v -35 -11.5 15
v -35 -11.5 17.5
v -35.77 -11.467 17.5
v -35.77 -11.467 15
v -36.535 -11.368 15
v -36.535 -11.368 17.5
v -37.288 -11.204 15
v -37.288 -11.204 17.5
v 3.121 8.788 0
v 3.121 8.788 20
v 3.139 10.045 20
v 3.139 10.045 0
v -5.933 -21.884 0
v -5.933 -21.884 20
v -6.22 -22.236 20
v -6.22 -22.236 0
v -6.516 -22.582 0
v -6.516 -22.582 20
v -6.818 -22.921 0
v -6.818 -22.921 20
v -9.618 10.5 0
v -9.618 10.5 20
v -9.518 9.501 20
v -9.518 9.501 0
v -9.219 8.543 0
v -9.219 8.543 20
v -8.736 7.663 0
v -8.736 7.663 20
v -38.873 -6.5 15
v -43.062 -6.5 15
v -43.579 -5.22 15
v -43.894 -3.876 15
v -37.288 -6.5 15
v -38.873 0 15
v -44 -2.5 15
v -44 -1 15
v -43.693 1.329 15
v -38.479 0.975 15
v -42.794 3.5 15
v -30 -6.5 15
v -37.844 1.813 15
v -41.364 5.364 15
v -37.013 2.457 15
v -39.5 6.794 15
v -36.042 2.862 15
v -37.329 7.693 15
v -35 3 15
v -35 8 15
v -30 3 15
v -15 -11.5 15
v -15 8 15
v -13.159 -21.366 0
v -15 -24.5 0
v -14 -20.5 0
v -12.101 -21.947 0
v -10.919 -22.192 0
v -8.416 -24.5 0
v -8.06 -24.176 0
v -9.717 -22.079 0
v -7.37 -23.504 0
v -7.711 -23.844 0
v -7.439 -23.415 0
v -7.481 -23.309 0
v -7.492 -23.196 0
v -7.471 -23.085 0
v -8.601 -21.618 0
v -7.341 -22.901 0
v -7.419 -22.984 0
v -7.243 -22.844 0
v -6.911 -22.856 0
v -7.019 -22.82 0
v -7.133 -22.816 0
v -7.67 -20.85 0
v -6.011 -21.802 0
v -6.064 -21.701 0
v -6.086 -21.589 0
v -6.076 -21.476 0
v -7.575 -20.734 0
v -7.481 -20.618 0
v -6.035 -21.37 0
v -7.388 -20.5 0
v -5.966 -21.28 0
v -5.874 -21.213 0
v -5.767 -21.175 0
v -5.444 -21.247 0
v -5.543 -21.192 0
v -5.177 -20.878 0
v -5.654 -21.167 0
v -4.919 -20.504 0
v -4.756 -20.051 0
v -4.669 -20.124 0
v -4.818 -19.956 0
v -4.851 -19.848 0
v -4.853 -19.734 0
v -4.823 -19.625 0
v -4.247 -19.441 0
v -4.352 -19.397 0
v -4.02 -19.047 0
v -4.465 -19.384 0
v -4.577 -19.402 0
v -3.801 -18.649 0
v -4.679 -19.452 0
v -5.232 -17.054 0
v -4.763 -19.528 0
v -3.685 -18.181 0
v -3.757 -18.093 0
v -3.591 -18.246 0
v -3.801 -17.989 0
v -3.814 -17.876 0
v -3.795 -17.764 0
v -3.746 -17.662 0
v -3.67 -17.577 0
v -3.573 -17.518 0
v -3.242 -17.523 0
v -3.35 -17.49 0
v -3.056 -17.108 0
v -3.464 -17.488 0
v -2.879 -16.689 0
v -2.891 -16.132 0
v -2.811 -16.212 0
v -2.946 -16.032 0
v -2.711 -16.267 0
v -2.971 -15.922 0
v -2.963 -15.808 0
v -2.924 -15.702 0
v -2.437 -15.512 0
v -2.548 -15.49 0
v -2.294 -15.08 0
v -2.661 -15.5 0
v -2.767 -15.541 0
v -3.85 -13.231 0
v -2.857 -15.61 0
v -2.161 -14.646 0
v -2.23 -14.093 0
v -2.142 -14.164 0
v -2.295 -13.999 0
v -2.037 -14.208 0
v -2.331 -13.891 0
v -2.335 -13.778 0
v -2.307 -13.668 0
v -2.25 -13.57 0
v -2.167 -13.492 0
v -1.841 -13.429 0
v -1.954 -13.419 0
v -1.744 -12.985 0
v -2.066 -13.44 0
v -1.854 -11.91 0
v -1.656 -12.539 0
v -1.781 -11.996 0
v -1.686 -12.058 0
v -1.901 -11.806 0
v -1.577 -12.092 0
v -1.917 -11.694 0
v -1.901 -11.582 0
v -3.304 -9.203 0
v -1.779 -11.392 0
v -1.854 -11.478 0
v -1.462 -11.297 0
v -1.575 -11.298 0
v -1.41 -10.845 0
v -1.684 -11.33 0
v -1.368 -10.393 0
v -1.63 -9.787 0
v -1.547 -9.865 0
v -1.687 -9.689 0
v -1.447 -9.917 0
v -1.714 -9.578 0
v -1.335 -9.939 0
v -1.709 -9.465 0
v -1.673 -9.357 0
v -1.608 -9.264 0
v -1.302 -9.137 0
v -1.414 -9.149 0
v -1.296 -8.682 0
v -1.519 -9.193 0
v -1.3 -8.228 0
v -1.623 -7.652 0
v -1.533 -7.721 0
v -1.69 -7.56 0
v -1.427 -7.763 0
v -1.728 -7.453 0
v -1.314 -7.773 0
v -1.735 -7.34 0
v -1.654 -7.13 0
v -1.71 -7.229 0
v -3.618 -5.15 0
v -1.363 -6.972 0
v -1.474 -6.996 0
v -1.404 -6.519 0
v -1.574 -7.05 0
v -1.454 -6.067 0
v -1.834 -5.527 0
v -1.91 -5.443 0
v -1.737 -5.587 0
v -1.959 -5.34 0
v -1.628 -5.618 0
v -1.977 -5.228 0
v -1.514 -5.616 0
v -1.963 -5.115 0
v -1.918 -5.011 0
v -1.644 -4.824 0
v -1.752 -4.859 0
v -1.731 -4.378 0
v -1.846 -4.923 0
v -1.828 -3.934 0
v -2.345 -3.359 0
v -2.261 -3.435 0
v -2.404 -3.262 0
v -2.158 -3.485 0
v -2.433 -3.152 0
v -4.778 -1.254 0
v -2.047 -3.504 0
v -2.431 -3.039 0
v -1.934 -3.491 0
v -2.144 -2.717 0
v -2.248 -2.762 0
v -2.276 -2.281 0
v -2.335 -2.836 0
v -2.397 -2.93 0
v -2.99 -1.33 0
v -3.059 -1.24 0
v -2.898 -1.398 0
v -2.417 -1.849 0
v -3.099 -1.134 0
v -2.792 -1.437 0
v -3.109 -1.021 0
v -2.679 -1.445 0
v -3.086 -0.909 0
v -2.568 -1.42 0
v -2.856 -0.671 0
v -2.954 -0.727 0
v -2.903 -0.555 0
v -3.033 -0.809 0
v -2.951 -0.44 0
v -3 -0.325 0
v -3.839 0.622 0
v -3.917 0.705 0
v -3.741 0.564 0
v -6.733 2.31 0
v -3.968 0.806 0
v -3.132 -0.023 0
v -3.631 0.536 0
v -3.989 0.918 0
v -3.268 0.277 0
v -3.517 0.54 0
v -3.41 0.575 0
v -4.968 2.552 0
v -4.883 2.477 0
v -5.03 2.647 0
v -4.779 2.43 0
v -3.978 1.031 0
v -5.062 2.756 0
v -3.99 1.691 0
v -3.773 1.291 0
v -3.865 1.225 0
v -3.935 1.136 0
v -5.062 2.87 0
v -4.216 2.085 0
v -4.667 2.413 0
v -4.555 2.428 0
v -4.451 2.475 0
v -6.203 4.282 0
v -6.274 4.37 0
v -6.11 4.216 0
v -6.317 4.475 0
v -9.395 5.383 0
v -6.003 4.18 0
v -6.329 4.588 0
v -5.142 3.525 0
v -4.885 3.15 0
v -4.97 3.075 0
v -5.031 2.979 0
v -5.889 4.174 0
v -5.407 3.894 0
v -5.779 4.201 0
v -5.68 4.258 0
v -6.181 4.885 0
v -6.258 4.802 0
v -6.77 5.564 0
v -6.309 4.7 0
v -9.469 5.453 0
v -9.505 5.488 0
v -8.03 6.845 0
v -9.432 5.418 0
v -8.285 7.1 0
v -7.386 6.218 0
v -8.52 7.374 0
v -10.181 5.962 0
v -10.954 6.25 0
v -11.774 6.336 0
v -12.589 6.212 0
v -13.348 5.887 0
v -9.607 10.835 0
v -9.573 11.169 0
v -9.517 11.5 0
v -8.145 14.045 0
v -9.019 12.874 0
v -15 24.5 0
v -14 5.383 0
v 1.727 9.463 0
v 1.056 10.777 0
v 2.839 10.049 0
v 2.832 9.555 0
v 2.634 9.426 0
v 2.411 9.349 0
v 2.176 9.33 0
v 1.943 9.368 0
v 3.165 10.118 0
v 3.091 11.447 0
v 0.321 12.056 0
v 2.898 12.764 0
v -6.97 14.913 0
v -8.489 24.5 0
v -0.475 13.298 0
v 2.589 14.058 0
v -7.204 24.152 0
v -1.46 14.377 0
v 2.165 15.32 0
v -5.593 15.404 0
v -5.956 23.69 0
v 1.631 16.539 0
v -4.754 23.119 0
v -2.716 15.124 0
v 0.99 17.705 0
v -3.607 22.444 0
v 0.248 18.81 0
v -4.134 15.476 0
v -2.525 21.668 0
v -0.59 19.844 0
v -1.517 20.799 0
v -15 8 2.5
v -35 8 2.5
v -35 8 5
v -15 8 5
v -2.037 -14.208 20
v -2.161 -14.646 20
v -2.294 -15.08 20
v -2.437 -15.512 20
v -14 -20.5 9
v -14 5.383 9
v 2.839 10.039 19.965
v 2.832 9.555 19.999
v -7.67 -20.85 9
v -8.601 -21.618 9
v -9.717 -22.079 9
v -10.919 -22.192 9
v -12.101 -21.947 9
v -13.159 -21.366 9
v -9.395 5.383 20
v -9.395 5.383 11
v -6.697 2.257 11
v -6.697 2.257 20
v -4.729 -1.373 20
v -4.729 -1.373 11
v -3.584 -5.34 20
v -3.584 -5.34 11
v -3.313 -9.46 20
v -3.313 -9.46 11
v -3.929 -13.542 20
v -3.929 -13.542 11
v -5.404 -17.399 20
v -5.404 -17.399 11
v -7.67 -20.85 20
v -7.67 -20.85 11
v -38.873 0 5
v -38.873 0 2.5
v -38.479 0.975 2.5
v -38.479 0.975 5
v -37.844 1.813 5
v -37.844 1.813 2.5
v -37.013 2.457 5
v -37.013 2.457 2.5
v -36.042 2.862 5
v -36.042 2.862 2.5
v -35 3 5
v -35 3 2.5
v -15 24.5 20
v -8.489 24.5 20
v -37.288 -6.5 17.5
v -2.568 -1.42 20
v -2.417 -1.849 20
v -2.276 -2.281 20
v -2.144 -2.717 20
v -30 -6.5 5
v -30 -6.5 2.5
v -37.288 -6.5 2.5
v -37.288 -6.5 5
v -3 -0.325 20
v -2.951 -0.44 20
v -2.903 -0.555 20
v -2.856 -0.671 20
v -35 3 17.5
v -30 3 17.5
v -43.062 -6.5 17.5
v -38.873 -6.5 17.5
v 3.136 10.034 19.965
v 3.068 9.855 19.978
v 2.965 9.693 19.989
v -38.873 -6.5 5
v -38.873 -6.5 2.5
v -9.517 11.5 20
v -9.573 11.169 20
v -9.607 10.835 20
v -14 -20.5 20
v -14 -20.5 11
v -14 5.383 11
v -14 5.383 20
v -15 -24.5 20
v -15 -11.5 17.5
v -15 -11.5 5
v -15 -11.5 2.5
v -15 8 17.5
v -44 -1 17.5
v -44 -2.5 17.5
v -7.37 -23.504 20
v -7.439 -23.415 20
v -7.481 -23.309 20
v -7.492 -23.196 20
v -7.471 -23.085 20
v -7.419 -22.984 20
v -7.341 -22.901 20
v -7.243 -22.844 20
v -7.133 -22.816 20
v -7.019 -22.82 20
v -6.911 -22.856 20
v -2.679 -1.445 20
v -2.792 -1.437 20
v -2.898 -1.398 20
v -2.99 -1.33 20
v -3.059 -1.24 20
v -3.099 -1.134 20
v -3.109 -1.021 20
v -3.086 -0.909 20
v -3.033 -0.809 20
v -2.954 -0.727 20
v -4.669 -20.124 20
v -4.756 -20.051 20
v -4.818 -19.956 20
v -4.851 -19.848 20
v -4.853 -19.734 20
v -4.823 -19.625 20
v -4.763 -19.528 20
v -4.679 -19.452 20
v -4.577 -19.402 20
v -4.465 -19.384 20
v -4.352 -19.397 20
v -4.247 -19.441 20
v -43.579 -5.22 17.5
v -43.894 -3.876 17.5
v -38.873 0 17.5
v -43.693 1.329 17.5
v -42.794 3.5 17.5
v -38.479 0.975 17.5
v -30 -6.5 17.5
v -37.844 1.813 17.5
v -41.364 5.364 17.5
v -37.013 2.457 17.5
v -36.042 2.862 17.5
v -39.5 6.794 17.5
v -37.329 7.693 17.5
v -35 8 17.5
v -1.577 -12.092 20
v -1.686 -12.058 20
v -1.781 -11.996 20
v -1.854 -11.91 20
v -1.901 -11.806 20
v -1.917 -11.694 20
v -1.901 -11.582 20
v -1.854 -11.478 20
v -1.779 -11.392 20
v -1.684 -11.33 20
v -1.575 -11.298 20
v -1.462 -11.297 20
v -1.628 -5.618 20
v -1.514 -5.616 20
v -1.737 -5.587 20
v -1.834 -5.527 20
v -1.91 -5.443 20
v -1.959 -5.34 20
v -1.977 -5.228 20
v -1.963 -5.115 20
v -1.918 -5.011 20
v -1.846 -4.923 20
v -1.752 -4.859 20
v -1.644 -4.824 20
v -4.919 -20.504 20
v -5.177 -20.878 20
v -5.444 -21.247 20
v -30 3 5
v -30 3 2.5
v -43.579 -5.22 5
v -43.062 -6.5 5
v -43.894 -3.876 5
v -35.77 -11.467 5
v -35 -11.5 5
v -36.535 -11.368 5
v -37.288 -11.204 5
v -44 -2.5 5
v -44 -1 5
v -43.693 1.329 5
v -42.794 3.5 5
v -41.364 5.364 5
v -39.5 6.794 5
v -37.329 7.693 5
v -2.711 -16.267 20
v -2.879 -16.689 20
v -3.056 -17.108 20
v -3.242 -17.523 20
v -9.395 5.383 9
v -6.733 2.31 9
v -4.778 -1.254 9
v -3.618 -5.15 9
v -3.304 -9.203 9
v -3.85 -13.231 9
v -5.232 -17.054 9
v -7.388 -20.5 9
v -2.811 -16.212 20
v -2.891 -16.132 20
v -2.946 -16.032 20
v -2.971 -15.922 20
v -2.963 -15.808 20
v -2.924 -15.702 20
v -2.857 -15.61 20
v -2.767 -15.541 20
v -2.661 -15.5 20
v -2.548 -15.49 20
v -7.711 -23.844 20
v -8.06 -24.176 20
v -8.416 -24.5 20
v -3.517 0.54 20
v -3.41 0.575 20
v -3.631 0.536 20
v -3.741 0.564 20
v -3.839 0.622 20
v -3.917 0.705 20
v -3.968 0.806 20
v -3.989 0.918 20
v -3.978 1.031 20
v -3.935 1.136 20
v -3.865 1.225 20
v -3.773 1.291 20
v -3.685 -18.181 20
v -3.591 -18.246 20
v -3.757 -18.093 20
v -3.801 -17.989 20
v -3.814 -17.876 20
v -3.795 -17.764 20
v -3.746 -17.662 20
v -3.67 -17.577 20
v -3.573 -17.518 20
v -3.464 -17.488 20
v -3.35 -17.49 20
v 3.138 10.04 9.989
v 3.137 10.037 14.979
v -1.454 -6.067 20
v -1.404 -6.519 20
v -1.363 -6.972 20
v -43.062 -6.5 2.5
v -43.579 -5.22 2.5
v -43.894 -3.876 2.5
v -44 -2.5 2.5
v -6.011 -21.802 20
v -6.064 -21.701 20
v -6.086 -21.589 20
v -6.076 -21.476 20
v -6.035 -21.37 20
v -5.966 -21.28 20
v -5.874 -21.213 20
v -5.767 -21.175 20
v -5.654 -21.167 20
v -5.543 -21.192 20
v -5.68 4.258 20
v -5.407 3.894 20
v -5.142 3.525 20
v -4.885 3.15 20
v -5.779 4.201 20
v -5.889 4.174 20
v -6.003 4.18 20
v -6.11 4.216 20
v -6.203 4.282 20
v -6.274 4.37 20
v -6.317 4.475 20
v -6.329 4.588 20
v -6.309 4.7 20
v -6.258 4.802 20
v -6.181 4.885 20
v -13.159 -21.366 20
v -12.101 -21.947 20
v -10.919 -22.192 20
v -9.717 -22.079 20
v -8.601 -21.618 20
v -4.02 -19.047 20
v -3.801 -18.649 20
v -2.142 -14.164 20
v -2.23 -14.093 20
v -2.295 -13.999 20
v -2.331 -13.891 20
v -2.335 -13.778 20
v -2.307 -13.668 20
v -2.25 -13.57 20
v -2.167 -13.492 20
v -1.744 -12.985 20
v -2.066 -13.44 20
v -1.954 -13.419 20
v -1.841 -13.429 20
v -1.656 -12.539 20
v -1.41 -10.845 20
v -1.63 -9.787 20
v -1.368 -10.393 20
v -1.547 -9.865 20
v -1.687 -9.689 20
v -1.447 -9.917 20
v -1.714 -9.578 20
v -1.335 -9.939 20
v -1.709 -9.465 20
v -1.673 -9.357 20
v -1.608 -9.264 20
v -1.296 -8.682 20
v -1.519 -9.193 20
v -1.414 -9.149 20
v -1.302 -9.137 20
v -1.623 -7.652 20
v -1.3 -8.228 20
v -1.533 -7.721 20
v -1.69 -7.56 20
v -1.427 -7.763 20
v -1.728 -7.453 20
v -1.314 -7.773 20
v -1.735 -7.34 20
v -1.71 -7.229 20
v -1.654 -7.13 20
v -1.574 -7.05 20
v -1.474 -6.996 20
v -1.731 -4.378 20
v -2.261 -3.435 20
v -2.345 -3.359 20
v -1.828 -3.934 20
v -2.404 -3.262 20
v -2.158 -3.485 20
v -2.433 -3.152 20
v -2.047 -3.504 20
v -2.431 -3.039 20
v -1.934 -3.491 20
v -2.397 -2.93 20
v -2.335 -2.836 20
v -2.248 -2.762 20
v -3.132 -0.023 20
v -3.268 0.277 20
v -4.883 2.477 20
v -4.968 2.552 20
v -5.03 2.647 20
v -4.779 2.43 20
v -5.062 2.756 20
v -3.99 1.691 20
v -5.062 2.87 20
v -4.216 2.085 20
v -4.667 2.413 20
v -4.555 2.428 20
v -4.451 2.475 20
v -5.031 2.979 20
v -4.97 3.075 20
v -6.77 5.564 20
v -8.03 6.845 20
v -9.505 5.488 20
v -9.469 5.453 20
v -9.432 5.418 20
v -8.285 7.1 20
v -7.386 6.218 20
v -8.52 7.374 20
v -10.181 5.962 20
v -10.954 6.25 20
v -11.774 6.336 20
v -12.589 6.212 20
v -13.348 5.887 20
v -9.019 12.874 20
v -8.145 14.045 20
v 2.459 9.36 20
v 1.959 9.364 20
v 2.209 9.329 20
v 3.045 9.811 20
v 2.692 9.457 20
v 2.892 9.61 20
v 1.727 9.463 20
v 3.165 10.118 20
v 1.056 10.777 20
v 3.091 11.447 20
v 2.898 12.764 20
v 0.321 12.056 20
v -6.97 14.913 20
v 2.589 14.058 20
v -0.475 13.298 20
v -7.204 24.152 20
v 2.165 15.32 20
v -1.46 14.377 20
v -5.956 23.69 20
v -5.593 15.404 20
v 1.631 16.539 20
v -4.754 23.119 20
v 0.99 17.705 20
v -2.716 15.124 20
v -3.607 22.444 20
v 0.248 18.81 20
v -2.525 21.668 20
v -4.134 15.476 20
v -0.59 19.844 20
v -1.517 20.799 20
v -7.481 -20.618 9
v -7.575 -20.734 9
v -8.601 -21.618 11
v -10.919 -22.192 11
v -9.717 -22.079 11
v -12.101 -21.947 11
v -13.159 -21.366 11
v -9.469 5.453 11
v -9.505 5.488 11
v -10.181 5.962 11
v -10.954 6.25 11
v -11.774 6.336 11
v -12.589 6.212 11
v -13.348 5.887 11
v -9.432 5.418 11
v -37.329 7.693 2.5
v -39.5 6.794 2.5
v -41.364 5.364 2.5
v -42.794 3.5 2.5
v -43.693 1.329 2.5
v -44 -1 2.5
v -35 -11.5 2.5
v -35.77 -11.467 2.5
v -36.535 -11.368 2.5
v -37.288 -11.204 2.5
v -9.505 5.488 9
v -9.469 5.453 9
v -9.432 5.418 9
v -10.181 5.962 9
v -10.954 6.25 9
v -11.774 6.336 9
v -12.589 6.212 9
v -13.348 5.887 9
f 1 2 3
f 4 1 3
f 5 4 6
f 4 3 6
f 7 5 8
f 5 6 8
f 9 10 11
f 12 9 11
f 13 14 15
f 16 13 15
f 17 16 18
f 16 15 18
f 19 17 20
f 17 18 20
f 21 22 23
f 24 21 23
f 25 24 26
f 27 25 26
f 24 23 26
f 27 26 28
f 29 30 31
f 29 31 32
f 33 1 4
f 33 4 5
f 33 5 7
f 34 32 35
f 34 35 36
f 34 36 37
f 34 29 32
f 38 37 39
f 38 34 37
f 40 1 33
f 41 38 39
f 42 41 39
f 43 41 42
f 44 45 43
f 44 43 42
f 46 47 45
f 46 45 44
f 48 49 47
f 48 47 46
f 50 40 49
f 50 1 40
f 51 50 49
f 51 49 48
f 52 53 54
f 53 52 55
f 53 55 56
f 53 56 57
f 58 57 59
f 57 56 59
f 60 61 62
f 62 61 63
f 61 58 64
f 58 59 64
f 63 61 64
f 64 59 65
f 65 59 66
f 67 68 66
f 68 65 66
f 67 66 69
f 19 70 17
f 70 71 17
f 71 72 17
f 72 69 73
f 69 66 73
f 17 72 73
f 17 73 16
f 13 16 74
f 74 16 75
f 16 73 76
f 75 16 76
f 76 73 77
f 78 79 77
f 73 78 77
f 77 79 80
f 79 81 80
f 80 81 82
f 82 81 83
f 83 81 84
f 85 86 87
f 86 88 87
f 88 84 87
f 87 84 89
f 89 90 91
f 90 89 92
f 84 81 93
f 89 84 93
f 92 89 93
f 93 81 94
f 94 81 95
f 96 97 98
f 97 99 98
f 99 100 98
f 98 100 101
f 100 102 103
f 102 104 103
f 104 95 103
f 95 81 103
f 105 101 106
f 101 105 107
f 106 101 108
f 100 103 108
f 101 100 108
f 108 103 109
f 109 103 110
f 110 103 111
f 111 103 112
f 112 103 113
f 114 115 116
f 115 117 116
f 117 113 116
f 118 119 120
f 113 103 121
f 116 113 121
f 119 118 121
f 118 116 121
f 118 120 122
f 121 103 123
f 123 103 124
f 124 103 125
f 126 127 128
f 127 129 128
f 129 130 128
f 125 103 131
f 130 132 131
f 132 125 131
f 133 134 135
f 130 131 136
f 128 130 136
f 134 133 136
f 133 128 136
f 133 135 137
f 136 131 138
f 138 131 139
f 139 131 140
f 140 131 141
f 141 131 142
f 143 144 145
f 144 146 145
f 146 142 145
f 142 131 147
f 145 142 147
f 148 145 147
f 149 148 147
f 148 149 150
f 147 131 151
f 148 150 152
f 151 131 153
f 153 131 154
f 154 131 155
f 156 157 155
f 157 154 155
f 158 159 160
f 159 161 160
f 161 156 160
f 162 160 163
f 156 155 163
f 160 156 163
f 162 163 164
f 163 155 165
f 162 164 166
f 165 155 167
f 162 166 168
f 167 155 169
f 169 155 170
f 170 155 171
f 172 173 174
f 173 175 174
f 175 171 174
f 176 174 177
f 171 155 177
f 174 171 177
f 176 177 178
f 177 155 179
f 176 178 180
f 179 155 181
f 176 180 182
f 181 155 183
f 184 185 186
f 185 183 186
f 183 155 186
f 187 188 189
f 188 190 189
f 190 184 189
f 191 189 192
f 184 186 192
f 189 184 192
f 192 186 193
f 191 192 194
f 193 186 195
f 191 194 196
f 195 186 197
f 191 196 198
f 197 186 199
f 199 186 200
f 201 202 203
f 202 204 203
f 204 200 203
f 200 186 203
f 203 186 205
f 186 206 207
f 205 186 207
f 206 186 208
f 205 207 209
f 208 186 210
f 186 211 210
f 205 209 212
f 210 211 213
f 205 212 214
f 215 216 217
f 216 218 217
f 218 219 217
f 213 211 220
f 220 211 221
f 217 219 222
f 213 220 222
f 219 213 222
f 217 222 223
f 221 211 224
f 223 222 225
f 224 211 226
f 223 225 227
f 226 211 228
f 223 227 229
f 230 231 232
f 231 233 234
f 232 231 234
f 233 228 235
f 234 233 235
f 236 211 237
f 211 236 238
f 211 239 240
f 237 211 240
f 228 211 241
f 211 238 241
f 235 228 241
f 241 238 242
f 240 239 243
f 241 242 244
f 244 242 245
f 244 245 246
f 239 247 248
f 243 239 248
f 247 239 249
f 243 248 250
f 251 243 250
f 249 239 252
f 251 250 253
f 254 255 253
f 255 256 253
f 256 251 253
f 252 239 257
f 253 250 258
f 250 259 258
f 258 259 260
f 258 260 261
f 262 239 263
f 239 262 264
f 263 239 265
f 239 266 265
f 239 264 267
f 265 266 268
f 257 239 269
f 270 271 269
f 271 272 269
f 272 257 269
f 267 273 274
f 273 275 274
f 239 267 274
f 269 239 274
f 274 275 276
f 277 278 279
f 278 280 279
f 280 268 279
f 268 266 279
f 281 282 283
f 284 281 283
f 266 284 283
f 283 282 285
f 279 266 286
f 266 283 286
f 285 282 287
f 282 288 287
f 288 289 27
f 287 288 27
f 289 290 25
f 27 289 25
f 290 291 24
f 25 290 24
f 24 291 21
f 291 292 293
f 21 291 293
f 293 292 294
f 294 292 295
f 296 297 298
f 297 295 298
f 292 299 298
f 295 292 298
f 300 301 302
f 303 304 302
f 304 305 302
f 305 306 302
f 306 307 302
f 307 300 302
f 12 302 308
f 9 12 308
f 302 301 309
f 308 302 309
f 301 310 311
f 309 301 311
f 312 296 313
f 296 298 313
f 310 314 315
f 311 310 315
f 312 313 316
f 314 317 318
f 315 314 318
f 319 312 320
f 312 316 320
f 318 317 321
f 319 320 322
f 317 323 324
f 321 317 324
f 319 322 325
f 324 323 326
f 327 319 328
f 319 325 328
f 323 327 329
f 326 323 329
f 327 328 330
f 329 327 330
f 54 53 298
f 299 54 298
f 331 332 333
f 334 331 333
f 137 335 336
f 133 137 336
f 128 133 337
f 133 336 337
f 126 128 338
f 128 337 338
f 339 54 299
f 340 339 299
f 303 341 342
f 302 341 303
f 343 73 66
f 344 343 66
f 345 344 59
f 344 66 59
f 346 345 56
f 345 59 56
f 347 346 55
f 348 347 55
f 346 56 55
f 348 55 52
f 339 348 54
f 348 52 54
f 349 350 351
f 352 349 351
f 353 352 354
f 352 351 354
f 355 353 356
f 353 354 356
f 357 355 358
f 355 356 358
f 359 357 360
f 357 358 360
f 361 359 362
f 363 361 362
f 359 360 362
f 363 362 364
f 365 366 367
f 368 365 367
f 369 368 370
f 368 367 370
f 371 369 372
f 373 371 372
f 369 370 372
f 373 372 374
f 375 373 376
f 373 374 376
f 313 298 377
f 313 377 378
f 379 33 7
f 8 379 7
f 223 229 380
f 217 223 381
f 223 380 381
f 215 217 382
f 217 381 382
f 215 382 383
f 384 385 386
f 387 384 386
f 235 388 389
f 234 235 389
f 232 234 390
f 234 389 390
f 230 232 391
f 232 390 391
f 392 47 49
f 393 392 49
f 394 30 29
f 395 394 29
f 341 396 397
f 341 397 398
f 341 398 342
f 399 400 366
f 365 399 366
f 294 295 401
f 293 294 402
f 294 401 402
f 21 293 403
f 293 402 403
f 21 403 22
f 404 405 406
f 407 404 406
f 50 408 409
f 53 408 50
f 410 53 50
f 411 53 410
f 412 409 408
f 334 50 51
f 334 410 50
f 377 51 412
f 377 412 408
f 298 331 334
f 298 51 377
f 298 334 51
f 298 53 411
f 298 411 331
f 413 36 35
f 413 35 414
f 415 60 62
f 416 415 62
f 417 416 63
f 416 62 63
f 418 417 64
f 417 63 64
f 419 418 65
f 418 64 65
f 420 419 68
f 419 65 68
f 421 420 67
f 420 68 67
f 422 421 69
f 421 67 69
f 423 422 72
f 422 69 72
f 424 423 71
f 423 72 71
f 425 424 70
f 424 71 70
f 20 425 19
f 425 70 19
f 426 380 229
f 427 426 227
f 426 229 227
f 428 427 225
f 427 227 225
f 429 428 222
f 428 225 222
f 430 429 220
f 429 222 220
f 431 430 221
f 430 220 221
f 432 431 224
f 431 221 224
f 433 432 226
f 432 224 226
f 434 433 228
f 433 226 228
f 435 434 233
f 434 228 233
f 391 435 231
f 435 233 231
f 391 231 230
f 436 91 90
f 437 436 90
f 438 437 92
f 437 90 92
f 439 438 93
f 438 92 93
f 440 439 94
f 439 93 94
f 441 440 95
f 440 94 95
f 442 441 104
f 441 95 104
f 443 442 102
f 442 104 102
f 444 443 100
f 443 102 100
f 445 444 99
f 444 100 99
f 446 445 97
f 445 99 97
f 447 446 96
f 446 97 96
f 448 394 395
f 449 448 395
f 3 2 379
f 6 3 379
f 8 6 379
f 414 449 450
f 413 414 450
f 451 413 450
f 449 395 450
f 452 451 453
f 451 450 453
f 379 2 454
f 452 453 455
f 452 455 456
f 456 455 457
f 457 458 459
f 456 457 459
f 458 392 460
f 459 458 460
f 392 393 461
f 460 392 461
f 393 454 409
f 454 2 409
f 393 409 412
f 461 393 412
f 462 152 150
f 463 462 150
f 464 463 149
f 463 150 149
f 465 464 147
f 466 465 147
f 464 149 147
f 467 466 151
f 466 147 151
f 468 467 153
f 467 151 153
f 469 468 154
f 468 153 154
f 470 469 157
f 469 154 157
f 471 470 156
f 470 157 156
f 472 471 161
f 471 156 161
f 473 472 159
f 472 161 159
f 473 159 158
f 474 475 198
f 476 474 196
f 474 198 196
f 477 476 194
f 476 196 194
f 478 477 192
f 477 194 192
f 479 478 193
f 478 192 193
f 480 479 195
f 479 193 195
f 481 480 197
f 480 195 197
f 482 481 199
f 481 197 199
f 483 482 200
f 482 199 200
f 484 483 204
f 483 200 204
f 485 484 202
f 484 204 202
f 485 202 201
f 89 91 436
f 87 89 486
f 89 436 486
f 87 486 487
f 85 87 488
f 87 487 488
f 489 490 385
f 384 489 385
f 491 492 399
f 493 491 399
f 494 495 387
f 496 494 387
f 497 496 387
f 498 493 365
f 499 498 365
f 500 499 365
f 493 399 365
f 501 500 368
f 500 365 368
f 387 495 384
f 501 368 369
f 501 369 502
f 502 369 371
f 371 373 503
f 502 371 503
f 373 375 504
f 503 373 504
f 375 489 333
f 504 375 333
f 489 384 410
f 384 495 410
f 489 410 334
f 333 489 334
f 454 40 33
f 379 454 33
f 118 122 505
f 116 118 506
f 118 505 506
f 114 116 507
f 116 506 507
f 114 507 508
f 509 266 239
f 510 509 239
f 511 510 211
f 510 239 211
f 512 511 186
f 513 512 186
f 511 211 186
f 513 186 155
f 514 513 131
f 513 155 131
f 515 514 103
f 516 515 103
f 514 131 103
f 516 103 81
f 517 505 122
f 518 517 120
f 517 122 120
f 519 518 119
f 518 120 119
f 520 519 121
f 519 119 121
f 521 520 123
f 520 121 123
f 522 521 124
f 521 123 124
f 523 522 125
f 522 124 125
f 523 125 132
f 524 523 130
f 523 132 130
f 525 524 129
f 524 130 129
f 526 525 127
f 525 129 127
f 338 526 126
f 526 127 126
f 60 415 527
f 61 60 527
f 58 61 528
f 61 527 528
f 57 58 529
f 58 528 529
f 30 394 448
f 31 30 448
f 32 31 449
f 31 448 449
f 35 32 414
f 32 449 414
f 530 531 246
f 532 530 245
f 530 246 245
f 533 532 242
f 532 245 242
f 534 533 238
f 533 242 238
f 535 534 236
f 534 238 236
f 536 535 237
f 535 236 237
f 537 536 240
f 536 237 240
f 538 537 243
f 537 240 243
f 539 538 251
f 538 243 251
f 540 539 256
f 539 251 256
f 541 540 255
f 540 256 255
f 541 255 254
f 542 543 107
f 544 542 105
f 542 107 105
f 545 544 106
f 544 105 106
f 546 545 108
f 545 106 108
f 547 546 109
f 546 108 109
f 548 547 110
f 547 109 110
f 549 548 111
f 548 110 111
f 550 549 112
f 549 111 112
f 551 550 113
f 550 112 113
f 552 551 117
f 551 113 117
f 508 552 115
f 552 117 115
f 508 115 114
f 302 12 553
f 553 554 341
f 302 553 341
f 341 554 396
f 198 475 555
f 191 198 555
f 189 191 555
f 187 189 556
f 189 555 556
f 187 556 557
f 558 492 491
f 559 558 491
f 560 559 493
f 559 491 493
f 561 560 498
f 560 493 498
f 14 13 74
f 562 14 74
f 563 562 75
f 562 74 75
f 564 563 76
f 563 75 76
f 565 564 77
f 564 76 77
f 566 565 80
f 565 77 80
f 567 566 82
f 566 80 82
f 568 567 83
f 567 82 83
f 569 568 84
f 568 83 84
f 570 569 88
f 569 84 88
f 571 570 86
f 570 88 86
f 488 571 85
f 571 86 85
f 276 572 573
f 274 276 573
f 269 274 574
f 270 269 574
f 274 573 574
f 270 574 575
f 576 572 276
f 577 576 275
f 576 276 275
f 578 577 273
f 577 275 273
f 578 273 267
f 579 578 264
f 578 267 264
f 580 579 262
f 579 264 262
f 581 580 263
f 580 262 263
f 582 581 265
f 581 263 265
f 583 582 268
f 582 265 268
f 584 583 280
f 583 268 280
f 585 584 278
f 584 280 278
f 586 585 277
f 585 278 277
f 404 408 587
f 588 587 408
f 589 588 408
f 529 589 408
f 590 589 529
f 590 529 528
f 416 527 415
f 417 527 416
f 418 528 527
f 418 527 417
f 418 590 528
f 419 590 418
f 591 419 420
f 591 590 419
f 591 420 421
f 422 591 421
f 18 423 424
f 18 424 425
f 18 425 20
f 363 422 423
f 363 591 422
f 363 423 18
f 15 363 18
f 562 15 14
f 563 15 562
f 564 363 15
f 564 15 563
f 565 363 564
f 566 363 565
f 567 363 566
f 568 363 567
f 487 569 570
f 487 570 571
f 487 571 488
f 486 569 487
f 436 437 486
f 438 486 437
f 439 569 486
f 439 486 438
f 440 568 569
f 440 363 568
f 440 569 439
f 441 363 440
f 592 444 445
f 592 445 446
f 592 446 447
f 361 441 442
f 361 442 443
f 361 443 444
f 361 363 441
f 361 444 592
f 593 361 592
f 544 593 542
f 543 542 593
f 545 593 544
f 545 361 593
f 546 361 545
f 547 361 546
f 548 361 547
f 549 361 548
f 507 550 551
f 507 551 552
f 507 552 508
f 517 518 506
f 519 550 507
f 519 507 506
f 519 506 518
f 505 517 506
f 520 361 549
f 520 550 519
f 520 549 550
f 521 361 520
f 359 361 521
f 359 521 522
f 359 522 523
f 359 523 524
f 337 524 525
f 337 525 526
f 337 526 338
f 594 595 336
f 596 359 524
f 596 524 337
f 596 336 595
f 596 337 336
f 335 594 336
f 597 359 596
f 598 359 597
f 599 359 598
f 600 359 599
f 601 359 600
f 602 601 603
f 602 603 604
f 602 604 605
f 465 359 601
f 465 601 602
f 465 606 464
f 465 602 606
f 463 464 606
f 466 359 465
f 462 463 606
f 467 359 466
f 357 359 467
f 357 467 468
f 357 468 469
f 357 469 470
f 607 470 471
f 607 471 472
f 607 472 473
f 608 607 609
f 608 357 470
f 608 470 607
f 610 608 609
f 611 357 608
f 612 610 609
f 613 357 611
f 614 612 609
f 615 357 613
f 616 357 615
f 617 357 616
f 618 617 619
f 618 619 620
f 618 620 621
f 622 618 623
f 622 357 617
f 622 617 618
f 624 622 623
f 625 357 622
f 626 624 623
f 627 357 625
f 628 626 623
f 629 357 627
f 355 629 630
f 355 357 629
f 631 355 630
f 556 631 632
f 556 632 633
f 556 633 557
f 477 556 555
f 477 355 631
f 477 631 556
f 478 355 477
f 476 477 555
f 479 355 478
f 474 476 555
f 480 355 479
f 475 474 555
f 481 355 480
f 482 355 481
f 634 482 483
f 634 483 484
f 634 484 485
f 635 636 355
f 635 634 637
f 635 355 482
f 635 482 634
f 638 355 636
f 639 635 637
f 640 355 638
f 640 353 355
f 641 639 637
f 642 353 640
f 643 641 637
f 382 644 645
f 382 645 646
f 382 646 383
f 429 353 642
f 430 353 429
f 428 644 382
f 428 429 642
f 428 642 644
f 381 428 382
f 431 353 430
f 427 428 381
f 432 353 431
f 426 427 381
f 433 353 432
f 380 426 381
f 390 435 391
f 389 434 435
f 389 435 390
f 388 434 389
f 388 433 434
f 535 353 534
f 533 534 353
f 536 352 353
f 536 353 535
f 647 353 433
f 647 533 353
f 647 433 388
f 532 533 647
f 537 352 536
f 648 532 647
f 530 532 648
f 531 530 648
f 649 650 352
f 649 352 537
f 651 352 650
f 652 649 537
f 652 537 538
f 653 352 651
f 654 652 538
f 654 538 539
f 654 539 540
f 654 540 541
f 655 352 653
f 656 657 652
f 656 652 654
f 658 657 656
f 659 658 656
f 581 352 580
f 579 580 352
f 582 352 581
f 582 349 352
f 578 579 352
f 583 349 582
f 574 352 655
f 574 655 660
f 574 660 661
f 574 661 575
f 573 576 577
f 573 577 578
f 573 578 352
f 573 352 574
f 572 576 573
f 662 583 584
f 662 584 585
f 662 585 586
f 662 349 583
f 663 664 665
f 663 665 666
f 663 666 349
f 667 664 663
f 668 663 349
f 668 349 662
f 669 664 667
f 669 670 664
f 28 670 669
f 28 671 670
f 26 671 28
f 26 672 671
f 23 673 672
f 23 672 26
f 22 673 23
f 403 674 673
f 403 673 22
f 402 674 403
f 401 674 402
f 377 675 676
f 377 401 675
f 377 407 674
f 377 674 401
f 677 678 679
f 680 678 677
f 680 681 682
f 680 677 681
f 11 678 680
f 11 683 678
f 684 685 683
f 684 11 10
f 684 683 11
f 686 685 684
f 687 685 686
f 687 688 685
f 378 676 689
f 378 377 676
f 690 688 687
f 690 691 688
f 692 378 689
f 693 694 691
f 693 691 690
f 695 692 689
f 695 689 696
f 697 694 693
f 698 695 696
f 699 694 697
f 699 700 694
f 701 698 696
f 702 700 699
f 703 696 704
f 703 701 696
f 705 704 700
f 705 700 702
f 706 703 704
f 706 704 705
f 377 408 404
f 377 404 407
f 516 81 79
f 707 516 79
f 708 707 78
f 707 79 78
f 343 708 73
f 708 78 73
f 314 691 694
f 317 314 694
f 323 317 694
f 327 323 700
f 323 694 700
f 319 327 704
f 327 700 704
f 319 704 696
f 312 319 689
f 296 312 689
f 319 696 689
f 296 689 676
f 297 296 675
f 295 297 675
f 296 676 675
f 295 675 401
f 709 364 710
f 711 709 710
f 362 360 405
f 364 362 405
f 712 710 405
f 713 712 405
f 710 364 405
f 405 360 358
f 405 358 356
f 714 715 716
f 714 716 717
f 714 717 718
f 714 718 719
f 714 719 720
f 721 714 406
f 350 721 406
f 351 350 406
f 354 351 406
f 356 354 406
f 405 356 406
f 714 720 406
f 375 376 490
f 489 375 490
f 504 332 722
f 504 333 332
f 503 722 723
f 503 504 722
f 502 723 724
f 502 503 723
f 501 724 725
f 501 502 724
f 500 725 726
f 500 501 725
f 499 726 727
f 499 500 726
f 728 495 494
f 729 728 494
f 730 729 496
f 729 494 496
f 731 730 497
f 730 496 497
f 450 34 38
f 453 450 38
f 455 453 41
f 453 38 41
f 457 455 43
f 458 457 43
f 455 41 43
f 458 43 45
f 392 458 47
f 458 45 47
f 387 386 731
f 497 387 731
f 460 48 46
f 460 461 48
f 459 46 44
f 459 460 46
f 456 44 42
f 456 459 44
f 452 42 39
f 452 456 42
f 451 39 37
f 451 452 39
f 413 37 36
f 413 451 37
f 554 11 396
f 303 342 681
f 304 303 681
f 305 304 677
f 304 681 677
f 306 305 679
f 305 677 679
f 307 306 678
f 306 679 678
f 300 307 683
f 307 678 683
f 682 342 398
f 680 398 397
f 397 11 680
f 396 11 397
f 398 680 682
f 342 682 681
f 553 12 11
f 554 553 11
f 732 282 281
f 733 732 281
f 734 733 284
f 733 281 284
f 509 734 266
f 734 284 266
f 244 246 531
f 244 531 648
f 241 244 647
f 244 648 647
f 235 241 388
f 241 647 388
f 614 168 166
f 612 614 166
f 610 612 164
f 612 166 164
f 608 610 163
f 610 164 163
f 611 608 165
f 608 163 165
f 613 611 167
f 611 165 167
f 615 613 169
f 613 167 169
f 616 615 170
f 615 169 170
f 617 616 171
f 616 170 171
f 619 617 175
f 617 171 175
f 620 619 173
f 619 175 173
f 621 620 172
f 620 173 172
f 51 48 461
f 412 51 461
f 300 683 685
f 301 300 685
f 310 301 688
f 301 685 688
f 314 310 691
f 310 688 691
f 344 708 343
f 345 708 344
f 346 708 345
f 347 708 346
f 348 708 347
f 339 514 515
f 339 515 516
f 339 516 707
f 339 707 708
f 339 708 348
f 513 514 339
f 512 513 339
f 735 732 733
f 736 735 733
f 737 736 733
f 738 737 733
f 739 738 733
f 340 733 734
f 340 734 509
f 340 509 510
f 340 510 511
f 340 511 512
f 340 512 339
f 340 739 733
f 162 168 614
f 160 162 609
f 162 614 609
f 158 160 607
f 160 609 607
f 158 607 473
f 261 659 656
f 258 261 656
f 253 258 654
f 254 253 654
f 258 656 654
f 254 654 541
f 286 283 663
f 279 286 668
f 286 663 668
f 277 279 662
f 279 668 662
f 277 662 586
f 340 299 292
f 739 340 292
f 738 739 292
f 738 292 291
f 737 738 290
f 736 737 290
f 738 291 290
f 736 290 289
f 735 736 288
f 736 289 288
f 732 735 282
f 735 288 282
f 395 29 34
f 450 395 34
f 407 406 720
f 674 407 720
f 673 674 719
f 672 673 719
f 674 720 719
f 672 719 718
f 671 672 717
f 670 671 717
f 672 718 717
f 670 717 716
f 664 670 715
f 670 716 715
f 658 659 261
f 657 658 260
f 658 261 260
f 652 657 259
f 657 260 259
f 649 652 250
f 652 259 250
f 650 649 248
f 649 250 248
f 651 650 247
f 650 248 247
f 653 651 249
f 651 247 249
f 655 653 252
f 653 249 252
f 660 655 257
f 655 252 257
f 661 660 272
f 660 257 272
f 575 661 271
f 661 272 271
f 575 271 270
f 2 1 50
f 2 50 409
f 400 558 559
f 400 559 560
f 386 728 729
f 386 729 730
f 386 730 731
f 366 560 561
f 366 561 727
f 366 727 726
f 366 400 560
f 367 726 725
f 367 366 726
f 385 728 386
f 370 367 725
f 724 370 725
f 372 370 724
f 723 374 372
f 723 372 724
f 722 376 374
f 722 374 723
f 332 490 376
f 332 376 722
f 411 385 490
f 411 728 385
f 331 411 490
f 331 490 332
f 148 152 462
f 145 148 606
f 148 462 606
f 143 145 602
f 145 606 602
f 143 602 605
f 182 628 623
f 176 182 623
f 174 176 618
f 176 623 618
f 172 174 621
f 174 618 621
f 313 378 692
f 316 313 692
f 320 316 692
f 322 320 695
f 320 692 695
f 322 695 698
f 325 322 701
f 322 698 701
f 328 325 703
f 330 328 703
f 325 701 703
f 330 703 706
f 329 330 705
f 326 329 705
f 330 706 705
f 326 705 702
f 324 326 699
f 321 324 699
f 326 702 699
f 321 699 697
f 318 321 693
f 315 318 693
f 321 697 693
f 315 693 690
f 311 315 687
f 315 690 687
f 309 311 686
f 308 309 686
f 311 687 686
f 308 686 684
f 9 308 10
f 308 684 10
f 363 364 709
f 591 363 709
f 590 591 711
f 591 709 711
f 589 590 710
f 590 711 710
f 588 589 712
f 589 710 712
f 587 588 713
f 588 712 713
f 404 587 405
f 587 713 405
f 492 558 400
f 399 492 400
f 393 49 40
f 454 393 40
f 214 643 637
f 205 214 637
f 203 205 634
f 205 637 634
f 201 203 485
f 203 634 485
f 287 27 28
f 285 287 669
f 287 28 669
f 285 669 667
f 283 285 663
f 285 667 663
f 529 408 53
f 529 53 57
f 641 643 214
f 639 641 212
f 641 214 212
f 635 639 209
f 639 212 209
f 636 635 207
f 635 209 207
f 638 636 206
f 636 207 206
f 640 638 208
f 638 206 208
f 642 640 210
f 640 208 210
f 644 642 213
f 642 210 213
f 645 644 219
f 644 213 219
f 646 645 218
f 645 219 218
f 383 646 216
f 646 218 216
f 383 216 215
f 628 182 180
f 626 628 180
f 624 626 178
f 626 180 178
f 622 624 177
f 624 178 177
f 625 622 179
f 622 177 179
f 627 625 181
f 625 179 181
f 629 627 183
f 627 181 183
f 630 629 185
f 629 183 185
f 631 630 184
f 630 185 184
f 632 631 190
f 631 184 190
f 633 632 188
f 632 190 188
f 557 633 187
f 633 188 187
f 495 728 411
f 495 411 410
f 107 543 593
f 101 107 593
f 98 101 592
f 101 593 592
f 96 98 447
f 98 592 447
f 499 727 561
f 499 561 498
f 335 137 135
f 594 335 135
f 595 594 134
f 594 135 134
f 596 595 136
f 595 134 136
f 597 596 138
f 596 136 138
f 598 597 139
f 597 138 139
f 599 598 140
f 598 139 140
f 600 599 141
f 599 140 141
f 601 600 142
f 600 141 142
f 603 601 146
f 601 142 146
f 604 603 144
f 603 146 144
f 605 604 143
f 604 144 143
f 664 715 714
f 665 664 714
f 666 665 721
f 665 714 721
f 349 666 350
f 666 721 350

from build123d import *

# Parameters (mm, degrees)
CROQUIS1_W              = 30
CROQUIS1_H              = 49
SALIENTE_EXTRUIR1_DEPTH = 20
CORTAR_EXTRUIR3_DEPTH   = 20
CORTAR_EXTRUIR5_DEPTH   = 20
CORTAR_EXTRUIR6_DEPTH   = 0.3
CROQUIS5_W              = 13.233735145
CROQUIS5_H              = 2.403316153
CORTAR_EXTRUIR9_DEPTH   = 20.3
CROQUIS6_W              = 2.5
CROQUIS6_H              = 19.5
SALIENTE_EXTRUIR2_DEPTH = 29
REDONDEO1_R             = 9
CORTAR_EXTRUIR10_DEPTH  = 29
CORTAR_EXTRUIR11_DEPTH  = 29
CORTAR_EXTRUIR16_DEPTH  = 9
CORTAR_EXTRUIR17_START  = -2
CORTAR_EXTRUIR17_DEPTH  = 9
CROQUIS13_R             = 0.40141899
CORTAR_EXTRUIR18_DEPTH  = 22
MATRIZC1_COUNT          = 15
MATRIZC1_ANGLE          = 82


with BuildPart() as part:
    # Croquis1 → Saliente-Extruir1 (new body)
    with BuildSketch(Plane.XY):
        Rectangle(CROQUIS1_W, CROQUIS1_H)
    extrude(amount=SALIENTE_EXTRUIR1_DEPTH)

    # Croquis2 → Cortar-Extruir3 (cut)
    with BuildSketch(Plane.XY.offset(20)):
        with BuildLine():
            ThreePointArc((-0.474525342, 13.297985817), (-5.593414892, 15.404003131), (-9.517328589, 11.5))
            ThreePointArc((-9.517328589, 11.5), (-9.593029868, 11.00254481), (-9.618349103, 10.5))
            ThreePointArc((-9.618349103, 10.5), (-9.39256168, 9.014438062), (-8.735591395, 7.663044605))
            ThreePointArc((-8.735591395, 7.663044605), (-8.404944841, 7.234775243), (-8.029958496, 6.84474059))
            ThreePointArc((-8.029958496, 6.84474059), (-5.140673383, 3.522596276), (-3, -0.324757201))
            ThreePointArc((-3, -0.324757201), (-1.808741917, -13.286004066), (-8.416261219, -24.5))
            Line((-8.416261219, -24.5), (15, -24.5))
            Line((15, -24.5), (15, 24.5))
            Line((15, 24.5), (-8.489066238, 24.5))
            ThreePointArc((-8.489066238, 24.5), (0.804926071, 18.001388169), (2.839493239, 6.84474059))
            ThreePointArc((2.839493239, 6.84474059), (1.375466316, 10.170467938), (-0.474525342, 13.297985817))
        make_face()
    extrude(amount=-CORTAR_EXTRUIR3_DEPTH, mode=Mode.SUBTRACT)

    # Croquis3 → Cortar-Extruir5 (cut)
    with BuildSketch(Plane.XY.offset(20)):
        with BuildLine():
            Line((3.120918342, 8.787733578), (3.139240721, 10.044961504))
            ThreePointArc((3.139240721, 10.044961504), (2.537101628, 9.384743505), (1.652711167, 9.512465101))
            Line((1.652711167, 9.512465101), (2.839493239, 6.84474059))
            Line((2.839493239, 6.84474059), (3.120918342, 8.787733578))
        make_face()
    extrude(amount=-CORTAR_EXTRUIR5_DEPTH, mode=Mode.SUBTRACT)

    # Croquis4 → Cortar-Extruir6 (cut)
    with BuildSketch(Plane(origin=(2.992213613, -0.043607425, 0), x_dir=(0, 0, 1), z_dir=(-0.999893822, 0.014572086, 0))):
        Polygon((19.964912912, 10.079116377), (20.184817926, 6.981498966), (0, 6.981498966), (0, 10.089640231), align=None)
    extrude(amount=CORTAR_EXTRUIR6_DEPTH, mode=Mode.SUBTRACT)

    # Croquis5 → Cortar-Extruir9 (cut)
    with BuildSketch(Plane(origin=(2.853385744, 6.940656131, 20), x_dir=(-1, 0, 0), z_dir=(0, 0, -1))):
        with Locations((-6.558491356, -0.917958816)):
            Rectangle(CROQUIS5_W, CROQUIS5_H)
    extrude(amount=CORTAR_EXTRUIR9_DEPTH, mode=Mode.SUBTRACT)

    # Croquis6 → Saliente-Extruir2 (add)
    with BuildSketch(Plane.ZY.offset(15)):
        with Locations((16.25, -1.75)):
            Rectangle(CROQUIS6_W, CROQUIS6_H)
        with Locations((3.75, -1.75)):
            Rectangle(CROQUIS6_W, CROQUIS6_H)
    extrude(amount=SALIENTE_EXTRUIR2_DEPTH)

    # Redondeo1
    redondeo1_edges = [part.edges().sort_by_distance(p)[0] for p in [
        (-44, -11.5, 16.25),
        (-44, 8, 16.25),
        (-44, -11.5, 3.75),
        (-44, 8, 3.75),
    ]]
    fillet(redondeo1_edges, radius=REDONDEO1_R)

    # Croquis7 → Cortar-Extruir10 (cut)
    with BuildSketch(Plane(origin=(0, 0, 2.5), x_dir=(-1, 0, 0), z_dir=(0, 0, -1))):
        with BuildLine():
            Line((37.288140826, -6.5), (37.288140826, -11.204275476))
            ThreePointArc((37.288140826, -11.204275476), (38.094193196, -10.951388553), (38.872983346, -10.624038405))
            Line((38.872983346, -10.624038405), (38.872983346, 0))
            ThreePointArc((38.872983346, 0), (37.449489743, 2.16227766), (35, 3))
            Line((35, 3), (30, 3))
            Line((30, 3), (30, -6.5))
            Line((30, -6.5), (37.288140826, -6.5))
        make_face()
    extrude(amount=-CORTAR_EXTRUIR10_DEPTH, mode=Mode.SUBTRACT)

    # Croquis8 → Cortar-Extruir11 (cut)
    with BuildSketch(Plane(origin=(0, 0, 2.5), x_dir=(-1, 0, 0), z_dir=(0, 0, -1))):
        with BuildLine():
            Line((43.062257748, -6.5), (38.872983346, -6.5))
            Line((38.872983346, -6.5), (38.872983346, -10.624038405))
            ThreePointArc((38.872983346, -10.624038405), (41.313827539, -8.91370266), (43.062257748, -6.5))
        make_face()
    extrude(amount=-CORTAR_EXTRUIR11_DEPTH, mode=Mode.SUBTRACT)

    # Croquis9 → Cortar-Extruir16 (cut)
    with BuildSketch(Plane(origin=(0, 0, 0), x_dir=(-1, 0, 0), z_dir=(0, 0, -1))):
        with BuildLine():
            Line((14, -20.5), (14, 5.382636826))
            ThreePointArc((14, 5.382636826), (11.773893936, 6.335545077), (9.505438523, 5.488377807))
            ThreePointArc((9.505438523, 5.488377807), (9.450309647, 5.43520412), (9.394602253, 5.382636826))
            ThreePointArc((9.394602253, 5.382636826), (3.353377533, -7.168166886), (7.3883863, -20.5))
            ThreePointArc((7.3883863, -20.5), (7.528094247, -20.675980579), (7.669852324, -20.850313944))
            ThreePointArc((7.669852324, -20.850313944), (10.918883483, -22.192259689), (14, -20.5))
        make_face()
    extrude(amount=-CORTAR_EXTRUIR16_DEPTH, mode=Mode.SUBTRACT)

    # Croquis11 → Cortar-Extruir17 (cut)
    with BuildSketch(Plane(origin=(0, 0, 9), x_dir=(-1, 0, 0), z_dir=(0, 0, -1)).offset(CORTAR_EXTRUIR17_START)):
        with BuildLine():
            Line((14, -20.5), (14, 5.382636826))
            ThreePointArc((14, 5.382636826), (11.773893936, 6.335545077), (9.505438523, 5.488377807))
            ThreePointArc((9.505438523, 5.488377807), (9.450309647, 5.43520412), (9.394602253, 5.382636826))
            ThreePointArc((9.394602253, 5.382636826), (3.337324426, -7.392286881), (7.669852324, -20.850313944))
            ThreePointArc((7.669852324, -20.850313944), (10.918883483, -22.192259689), (14, -20.5))
        make_face()
    extrude(amount=-CORTAR_EXTRUIR17_DEPTH, mode=Mode.SUBTRACT)

    # Croquis13 → Cortar-Extruir18 (cut)
    with BuildSketch(Plane(origin=(0, 0, 0), x_dir=(-1, 0, 0), z_dir=(0, 0, -1))):
        with Locations((5.927972834, 4.573929347)):
            Circle(CROQUIS13_R)
    cortar_extruir18 = extrude(amount=-CORTAR_EXTRUIR18_DEPTH, mode=Mode.SUBTRACT)

    # MatrizC1: Cortar-Extruir18 ×15 about axis
    matrizc1_axis = Axis((-22.493499964, -8.651756801, 0), (0, 0, -1))
    for i in range(1, MATRIZC1_COUNT):
        add(cortar_extruir18.rotate(matrizc1_axis, i * MATRIZC1_ANGLE / (MATRIZC1_COUNT - 1)), mode=Mode.SUBTRACT)


solid = part.part
